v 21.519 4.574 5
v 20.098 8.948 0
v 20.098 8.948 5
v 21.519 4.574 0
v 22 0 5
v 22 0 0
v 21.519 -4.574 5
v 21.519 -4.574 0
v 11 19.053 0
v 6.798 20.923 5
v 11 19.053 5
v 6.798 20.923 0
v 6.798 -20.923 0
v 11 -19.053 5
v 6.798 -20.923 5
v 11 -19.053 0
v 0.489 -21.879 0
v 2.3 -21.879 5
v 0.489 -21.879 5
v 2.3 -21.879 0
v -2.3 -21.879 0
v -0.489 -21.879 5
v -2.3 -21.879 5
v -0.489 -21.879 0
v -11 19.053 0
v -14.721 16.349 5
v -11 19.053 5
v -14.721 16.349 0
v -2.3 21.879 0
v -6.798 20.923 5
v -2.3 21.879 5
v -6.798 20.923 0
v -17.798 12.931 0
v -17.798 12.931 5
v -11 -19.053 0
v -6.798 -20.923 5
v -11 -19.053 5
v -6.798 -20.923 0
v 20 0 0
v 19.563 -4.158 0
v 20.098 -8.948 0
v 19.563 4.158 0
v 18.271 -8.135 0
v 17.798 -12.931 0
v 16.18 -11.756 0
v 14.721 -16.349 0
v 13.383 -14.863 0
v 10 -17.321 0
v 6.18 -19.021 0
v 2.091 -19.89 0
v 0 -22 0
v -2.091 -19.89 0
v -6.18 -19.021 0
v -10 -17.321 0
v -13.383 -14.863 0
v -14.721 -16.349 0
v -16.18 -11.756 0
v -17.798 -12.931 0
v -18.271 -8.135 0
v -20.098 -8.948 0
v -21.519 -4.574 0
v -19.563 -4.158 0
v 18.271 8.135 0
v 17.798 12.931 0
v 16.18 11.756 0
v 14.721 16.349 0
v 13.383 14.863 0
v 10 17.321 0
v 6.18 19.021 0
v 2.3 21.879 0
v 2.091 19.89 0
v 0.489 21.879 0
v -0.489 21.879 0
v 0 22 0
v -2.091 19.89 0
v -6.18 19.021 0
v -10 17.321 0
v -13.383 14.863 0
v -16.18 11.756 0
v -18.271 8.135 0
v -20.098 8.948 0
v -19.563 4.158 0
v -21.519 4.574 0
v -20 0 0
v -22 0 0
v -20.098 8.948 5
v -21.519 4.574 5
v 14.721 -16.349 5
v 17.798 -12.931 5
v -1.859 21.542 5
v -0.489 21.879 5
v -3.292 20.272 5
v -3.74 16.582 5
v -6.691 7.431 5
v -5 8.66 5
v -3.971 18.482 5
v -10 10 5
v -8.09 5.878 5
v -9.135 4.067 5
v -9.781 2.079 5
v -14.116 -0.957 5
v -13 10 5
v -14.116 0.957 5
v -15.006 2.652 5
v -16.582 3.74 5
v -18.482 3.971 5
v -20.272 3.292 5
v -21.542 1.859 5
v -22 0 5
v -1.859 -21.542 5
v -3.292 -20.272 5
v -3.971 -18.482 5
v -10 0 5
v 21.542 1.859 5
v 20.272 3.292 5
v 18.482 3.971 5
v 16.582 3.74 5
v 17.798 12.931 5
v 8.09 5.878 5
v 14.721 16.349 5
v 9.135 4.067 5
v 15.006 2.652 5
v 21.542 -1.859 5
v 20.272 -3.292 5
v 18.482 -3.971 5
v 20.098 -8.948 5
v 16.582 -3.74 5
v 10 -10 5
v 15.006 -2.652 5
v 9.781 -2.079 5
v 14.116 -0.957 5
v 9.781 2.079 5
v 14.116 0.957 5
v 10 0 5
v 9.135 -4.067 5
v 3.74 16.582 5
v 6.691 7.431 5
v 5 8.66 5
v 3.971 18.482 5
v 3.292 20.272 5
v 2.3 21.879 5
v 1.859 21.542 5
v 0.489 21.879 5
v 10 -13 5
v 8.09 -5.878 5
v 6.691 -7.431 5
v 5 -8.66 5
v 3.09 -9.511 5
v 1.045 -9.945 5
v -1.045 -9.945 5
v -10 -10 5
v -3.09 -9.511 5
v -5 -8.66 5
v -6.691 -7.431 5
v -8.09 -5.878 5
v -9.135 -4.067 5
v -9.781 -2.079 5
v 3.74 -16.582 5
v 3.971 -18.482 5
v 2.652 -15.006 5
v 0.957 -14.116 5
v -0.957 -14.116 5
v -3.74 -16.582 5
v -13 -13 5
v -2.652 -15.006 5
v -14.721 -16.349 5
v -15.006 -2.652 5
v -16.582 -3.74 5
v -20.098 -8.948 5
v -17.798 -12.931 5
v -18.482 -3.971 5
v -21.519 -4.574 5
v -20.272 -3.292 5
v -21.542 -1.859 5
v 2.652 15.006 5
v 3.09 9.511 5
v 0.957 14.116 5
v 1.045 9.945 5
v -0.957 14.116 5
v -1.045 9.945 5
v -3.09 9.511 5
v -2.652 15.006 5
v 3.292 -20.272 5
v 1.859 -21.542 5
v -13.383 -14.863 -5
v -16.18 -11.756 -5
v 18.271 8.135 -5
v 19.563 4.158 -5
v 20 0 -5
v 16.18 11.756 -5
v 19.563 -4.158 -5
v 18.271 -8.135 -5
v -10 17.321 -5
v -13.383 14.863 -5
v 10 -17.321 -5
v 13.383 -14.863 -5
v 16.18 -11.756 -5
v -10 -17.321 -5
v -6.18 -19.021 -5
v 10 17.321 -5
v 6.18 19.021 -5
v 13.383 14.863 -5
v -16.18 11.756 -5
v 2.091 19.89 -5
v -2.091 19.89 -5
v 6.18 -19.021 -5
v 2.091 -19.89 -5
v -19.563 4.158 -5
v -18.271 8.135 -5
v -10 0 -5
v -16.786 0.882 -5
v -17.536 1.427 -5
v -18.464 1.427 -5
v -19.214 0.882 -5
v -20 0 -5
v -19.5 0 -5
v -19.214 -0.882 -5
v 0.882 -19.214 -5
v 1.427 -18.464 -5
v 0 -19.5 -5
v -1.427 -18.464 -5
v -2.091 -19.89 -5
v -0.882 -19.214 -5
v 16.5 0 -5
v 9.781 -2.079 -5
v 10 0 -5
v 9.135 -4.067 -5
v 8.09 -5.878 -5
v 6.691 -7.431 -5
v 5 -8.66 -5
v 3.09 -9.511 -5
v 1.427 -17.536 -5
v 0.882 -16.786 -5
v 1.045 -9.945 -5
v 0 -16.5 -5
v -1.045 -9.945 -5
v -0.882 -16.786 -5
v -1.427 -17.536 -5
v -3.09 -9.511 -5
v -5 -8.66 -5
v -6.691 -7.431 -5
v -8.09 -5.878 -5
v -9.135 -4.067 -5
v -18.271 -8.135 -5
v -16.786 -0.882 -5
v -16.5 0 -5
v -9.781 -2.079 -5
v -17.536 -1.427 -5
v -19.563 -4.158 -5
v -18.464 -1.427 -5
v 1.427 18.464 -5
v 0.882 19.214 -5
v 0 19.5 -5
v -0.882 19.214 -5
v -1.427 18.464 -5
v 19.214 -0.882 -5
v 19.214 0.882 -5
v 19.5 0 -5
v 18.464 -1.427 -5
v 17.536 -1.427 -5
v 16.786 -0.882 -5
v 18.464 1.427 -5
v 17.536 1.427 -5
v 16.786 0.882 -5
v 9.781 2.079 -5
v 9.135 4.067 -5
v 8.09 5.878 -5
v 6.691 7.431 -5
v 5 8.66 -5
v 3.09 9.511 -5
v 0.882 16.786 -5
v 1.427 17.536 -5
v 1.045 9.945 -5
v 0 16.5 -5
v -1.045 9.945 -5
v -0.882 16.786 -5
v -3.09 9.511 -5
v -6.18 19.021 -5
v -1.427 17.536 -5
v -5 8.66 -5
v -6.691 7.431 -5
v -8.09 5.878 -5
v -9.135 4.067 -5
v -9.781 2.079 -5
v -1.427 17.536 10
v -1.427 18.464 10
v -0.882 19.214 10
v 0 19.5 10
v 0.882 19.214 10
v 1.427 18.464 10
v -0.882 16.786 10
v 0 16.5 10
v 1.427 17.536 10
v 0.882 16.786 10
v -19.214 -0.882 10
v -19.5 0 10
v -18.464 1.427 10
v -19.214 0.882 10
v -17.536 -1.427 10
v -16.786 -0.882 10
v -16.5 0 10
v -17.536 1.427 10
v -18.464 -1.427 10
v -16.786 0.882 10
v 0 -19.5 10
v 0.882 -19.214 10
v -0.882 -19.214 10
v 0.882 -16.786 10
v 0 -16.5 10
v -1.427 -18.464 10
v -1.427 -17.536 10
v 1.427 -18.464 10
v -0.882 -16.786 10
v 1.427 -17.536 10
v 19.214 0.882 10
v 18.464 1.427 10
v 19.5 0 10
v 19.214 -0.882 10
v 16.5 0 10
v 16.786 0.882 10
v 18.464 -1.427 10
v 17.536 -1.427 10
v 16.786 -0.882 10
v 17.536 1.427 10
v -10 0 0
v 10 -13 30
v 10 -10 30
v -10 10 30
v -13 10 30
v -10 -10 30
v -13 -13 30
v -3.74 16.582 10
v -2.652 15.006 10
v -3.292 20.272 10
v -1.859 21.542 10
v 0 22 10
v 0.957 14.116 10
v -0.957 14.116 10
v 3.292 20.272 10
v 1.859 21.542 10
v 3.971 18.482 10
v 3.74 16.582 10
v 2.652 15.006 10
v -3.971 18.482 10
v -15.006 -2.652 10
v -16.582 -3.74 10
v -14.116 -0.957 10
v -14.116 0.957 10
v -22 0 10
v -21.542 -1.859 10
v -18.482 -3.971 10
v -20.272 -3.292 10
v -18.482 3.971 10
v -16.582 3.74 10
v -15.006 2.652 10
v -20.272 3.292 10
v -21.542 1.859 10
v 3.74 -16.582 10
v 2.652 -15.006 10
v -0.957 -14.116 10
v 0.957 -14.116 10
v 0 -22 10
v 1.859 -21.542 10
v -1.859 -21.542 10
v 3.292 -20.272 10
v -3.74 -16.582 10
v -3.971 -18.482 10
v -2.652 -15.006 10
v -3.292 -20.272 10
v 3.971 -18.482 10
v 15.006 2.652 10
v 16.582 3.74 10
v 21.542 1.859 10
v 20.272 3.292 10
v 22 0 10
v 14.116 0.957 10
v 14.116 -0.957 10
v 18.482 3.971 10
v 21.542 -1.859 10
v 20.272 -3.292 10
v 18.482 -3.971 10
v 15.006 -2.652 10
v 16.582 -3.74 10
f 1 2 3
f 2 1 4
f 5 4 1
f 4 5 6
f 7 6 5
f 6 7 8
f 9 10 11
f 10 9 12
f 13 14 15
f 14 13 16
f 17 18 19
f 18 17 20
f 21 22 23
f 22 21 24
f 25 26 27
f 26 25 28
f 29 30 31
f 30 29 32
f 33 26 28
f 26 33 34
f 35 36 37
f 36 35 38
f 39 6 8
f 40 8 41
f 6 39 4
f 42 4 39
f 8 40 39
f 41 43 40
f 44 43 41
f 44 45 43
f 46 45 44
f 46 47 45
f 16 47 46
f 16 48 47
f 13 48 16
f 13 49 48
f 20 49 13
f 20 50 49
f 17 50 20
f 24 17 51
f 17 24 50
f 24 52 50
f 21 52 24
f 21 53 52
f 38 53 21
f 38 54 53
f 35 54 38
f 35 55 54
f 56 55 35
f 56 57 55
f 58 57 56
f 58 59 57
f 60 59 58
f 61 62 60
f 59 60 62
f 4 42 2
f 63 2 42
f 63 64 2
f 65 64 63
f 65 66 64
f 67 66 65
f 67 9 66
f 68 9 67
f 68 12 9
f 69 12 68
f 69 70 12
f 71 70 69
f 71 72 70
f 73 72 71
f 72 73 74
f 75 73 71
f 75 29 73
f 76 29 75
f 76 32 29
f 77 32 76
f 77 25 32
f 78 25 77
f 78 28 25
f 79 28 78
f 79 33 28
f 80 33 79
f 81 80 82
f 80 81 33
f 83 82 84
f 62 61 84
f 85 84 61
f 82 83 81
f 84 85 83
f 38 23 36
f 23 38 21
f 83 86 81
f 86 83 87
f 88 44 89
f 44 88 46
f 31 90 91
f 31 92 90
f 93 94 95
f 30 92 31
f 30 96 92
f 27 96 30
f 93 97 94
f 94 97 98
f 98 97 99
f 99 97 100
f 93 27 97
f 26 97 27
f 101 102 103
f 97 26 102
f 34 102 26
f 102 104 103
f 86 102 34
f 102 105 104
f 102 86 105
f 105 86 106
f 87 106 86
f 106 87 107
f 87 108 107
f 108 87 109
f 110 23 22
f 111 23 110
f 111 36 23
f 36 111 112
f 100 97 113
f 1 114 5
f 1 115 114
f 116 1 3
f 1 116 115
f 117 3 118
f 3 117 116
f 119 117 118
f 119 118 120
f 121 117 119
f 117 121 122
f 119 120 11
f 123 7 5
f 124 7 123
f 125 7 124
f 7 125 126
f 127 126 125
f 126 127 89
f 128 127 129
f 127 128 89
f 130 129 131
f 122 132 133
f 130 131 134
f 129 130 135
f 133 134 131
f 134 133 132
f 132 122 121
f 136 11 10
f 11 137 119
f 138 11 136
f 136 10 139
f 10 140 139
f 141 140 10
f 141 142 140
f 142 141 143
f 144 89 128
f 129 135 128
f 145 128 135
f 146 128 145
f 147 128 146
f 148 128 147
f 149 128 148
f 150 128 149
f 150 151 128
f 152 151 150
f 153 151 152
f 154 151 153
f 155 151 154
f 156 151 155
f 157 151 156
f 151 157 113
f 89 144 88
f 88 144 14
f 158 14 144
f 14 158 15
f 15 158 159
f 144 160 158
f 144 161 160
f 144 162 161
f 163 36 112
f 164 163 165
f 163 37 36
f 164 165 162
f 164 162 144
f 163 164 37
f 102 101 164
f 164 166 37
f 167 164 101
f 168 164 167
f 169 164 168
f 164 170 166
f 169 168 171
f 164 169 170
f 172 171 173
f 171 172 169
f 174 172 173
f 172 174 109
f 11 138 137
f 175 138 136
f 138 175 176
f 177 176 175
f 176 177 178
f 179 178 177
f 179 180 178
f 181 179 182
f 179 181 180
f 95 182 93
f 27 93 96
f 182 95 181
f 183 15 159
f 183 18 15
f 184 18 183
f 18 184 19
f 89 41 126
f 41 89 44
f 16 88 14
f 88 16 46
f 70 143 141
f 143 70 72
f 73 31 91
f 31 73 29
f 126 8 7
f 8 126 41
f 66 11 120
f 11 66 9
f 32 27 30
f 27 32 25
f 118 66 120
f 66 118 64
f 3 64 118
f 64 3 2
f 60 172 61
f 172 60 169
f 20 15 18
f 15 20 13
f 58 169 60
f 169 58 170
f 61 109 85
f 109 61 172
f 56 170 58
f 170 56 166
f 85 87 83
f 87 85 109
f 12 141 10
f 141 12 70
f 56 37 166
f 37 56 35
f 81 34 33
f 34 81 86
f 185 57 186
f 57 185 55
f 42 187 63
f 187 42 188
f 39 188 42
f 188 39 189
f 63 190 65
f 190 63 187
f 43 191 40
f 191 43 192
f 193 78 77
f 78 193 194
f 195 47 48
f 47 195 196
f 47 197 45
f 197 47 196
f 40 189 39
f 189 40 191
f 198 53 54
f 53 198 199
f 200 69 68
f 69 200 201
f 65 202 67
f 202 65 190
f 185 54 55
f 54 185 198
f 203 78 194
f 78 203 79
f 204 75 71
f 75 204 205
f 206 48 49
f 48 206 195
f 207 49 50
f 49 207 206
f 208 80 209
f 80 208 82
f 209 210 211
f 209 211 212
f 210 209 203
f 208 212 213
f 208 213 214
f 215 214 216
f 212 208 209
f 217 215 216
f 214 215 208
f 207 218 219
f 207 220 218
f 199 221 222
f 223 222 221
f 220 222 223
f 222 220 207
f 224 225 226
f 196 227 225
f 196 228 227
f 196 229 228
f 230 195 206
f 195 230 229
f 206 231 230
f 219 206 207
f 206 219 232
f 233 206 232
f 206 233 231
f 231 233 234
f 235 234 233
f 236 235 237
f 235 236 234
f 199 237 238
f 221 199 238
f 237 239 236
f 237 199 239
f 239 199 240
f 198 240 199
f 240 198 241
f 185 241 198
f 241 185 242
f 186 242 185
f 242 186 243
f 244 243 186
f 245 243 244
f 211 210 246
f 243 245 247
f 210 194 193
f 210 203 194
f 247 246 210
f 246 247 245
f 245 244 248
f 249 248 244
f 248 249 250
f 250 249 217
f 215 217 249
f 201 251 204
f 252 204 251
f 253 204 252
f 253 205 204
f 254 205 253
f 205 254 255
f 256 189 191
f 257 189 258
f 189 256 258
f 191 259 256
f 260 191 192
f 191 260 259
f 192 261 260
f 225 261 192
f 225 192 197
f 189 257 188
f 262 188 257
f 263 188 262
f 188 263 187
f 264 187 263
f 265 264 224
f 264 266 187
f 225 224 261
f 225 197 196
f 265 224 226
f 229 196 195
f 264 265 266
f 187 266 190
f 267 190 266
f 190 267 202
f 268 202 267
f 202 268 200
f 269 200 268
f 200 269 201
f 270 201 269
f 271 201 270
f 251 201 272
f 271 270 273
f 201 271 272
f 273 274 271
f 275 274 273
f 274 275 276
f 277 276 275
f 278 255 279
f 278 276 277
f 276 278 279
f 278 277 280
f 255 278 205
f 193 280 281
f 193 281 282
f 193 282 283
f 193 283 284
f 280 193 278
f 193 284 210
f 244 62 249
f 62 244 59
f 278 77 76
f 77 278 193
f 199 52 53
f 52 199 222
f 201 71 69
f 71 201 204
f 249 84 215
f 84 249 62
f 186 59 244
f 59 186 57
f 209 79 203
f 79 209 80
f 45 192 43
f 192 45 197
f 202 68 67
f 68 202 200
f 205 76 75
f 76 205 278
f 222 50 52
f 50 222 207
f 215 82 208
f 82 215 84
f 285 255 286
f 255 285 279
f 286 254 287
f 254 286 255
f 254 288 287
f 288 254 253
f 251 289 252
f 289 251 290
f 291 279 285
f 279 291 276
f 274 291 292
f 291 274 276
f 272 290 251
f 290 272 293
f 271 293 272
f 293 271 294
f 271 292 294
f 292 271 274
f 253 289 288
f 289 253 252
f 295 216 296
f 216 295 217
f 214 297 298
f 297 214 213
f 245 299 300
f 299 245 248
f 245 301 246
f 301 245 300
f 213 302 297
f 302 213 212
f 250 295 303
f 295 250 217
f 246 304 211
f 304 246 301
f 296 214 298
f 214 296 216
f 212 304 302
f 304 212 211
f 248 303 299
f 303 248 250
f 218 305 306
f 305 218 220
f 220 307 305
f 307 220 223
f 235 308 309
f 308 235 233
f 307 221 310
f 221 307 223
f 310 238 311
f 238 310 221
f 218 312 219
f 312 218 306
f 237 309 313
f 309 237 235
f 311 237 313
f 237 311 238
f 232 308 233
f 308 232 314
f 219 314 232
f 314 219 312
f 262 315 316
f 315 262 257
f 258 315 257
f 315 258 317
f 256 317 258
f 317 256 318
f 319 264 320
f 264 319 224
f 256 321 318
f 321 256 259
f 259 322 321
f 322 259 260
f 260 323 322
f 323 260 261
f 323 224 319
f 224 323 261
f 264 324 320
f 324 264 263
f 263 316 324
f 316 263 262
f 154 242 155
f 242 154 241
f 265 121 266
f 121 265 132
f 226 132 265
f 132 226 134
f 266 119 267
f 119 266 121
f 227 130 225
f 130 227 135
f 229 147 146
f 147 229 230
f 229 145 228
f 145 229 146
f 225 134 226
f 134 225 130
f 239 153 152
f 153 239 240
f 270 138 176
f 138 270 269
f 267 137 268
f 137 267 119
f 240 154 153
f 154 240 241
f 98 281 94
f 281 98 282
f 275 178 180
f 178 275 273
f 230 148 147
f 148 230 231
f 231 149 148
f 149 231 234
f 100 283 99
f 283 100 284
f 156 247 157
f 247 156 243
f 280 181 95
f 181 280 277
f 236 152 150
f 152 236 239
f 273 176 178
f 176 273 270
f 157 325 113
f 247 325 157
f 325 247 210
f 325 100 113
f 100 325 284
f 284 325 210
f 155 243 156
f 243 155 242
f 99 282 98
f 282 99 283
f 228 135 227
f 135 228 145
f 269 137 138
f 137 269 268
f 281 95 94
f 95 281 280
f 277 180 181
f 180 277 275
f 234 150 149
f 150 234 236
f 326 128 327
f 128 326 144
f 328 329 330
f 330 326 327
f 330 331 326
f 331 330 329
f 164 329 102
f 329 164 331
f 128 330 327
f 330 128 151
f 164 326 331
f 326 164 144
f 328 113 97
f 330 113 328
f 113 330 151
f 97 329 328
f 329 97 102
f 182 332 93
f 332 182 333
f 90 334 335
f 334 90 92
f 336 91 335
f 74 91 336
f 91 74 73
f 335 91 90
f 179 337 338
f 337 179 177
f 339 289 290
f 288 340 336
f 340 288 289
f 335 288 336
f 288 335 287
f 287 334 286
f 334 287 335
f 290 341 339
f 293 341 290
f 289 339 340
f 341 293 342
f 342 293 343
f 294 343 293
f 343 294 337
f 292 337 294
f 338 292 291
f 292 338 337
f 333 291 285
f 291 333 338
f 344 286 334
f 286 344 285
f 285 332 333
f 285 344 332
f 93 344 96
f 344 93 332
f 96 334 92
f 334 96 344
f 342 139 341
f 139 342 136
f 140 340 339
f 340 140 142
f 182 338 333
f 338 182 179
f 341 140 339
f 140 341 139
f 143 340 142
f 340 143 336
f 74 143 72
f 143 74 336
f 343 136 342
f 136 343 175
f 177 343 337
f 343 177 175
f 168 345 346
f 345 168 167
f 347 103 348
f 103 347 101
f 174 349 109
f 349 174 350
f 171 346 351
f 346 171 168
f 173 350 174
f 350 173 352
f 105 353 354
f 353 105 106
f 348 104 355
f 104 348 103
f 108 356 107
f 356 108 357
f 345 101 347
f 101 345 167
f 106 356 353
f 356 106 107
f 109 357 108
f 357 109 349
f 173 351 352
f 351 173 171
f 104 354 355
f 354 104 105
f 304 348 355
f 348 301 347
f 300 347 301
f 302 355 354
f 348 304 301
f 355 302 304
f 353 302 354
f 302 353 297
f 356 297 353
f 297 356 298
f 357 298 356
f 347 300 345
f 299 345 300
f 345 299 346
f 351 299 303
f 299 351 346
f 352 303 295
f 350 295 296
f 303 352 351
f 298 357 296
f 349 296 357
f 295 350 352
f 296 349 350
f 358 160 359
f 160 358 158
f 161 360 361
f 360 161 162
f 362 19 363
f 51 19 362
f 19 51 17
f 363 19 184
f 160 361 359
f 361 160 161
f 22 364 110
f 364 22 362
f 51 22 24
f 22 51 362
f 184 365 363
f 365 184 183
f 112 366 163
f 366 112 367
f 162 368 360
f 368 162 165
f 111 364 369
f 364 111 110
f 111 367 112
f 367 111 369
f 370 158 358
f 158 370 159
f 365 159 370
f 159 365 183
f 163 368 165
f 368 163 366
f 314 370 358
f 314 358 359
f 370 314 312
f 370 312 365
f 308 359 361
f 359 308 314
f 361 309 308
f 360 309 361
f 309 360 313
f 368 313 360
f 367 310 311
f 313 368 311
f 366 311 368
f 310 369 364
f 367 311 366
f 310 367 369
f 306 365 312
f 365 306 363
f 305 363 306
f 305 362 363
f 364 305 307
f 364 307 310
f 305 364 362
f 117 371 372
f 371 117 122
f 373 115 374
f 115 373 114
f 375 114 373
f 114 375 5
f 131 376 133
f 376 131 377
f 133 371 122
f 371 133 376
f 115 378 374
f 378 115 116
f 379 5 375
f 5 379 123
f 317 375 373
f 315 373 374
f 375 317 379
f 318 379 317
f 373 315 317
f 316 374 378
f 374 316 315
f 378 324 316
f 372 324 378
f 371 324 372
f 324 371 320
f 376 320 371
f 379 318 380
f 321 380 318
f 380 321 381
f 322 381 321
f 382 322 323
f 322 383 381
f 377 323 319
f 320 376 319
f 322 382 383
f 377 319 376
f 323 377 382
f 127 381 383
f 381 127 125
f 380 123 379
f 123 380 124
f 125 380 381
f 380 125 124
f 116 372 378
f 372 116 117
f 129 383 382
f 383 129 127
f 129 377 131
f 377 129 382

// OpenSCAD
MP=1; //Manifold protection fudge number to prevent non-manifold shapes;

module nut_hole(
	RADIUS=2, //mm
)
{
	cylinder(r1=RADIUS+0.5, r2=RADIUS+0.5, h=60);
}


module bottom(
	MAX_PEN_RADIUS=10, //mm
	X_CARRIAGE_HOLE_RADIUS=20, //mm
	X_CARRIAGE_HOLE_DEPTH=5, //mm
	BOTTOM_HEIGHT = 20, //mm
	WALL_WIDTH=3, //mm
	HOLES = 4,
	BOLT_RADIUS=2, //mm
)
{
	color("green")
	difference()
	{
		union()
		{
			//ledge to hold drawing head in hole
			cylinder (r1=X_CARRIAGE_HOLE_RADIUS+2, r2=X_CARRIAGE_HOLE_RADIUS+2, h=X_CARRIAGE_HOLE_DEPTH);
			
			//plug for x-carriage hole
			translate([0,0,-5]) cylinder(r1=X_CARRIAGE_HOLE_RADIUS, r2=X_CARRIAGE_HOLE_RADIUS, h=X_CARRIAGE_HOLE_DEPTH);
		}

		//centre hole
		# translate([0,0,-50]) cylinder(r1=MAX_PEN_RADIUS, r2=MAX_PEN_RADIUS, h=100);

		//holes for screws
		for (i = [1:HOLES])
		{

			rotate([0,0,360/HOLES*i])
			translate([X_CARRIAGE_HOLE_RADIUS-BOLT_RADIUS,0,-20-MP])
			# cylinder(r1=1.5, r2=1.5, h=50, $fn=10);
		}

	}
}

module top(
	HOLES=4,
	HOLE_RADIUS=2, //mm
	MAX_PEN_RADIUS=10, //mm
	X_CARRIAGE_HOLE_RADIUS=20, //mm
	BOLT_RADIUS=2, //mm
)
{
	difference()
	{
		union()
		{
			cylinder(r1=X_CARRIAGE_HOLE_RADIUS-HOLE_RADIUS,r2=X_CARRIAGE_HOLE_RADIUS-HOLE_RADIUS,h=5);

			//loops to hold holes
			for (i = [1:HOLES])
			{
				rotate([0,0,360/HOLES*i])
				translate([X_CARRIAGE_HOLE_RADIUS-BOLT_RADIUS,0,0])
				cylinder(r1=BOLT_RADIUS*2, r2=BOLT_RADIUS*2, h=10);
			}
		}
		//screw holes
		for (i = [1:HOLES])
		{
			//holes for screws
			rotate([0,0,360/HOLES*i])
			translate([X_CARRIAGE_HOLE_RADIUS-BOLT_RADIUS, 0, -MP])
			# cylinder(r1=1.5, r2=1.5, h=15, $fn=10);
		}

		translate([0,0,-MP])
		# cylinder(r1=MAX_PEN_RADIUS, r2=MAX_PEN_RADIUS, h=10);
	}
}

module v_clamp_channel(
	MAX_PEN_RADIUS=10, //mm
	CLAMP_THICKNESS=3, //mm
	LENGTH=30, //mm
)
{
	translate([-CLAMP_THICKNESS-MAX_PEN_RADIUS, -CLAMP_THICKNESS-MAX_PEN_RADIUS,0])
	union()
	{
		cube([MAX_PEN_RADIUS*2+CLAMP_THICKNESS, CLAMP_THICKNESS, LENGTH]);
		translate([CLAMP_THICKNESS, 0, 0]) rotate([0, 0, 90]) cube([MAX_PEN_RADIUS*2+CLAMP_THICKNESS, CLAMP_THICKNESS, LENGTH]);
	}

	//translate([0,MAX_PEN_RADIUS,0])
	//rotate([0,0,45])
	//# cube([CLAMP_THICKNESS, 10, 20]);
}

module clamp(
	HOLE_RADIUS=2, //mm
	HOLE_DISTANCE=30, //mm
	EDGE=3, //mm
	HEIGHT=5, //mm
	WIDTH
)
{
	difference()
	{
		linear_extrude(height=HEIGHT)
		hull()
		{
			translate([HOLE_DISTANCE/2,0,0]) circle(HOLE_RADIUS+EDGE);
			translate([-HOLE_DISTANCE/2,0,0]) circle(HOLE_RADIUS+EDGE);
		}
		translate([HOLE_DISTANCE/2,0,-MP/2]) cylinder(r1=HOLE_RADIUS, r2=HOLE_RADIUS, h=HEIGHT+MP);
		translate([-HOLE_DISTANCE/2,0,-MP/2]) cylinder(r1=HOLE_RADIUS, r2=HOLE_RADIUS, h=HEIGHT+MP);
	}
}



bottom();
v_clamp_channel();
difference()
{
	top();	
	# translate([-10,-10,0]) cube([20,20,100]);
}
//translate ([0,0,10]) clamp();
